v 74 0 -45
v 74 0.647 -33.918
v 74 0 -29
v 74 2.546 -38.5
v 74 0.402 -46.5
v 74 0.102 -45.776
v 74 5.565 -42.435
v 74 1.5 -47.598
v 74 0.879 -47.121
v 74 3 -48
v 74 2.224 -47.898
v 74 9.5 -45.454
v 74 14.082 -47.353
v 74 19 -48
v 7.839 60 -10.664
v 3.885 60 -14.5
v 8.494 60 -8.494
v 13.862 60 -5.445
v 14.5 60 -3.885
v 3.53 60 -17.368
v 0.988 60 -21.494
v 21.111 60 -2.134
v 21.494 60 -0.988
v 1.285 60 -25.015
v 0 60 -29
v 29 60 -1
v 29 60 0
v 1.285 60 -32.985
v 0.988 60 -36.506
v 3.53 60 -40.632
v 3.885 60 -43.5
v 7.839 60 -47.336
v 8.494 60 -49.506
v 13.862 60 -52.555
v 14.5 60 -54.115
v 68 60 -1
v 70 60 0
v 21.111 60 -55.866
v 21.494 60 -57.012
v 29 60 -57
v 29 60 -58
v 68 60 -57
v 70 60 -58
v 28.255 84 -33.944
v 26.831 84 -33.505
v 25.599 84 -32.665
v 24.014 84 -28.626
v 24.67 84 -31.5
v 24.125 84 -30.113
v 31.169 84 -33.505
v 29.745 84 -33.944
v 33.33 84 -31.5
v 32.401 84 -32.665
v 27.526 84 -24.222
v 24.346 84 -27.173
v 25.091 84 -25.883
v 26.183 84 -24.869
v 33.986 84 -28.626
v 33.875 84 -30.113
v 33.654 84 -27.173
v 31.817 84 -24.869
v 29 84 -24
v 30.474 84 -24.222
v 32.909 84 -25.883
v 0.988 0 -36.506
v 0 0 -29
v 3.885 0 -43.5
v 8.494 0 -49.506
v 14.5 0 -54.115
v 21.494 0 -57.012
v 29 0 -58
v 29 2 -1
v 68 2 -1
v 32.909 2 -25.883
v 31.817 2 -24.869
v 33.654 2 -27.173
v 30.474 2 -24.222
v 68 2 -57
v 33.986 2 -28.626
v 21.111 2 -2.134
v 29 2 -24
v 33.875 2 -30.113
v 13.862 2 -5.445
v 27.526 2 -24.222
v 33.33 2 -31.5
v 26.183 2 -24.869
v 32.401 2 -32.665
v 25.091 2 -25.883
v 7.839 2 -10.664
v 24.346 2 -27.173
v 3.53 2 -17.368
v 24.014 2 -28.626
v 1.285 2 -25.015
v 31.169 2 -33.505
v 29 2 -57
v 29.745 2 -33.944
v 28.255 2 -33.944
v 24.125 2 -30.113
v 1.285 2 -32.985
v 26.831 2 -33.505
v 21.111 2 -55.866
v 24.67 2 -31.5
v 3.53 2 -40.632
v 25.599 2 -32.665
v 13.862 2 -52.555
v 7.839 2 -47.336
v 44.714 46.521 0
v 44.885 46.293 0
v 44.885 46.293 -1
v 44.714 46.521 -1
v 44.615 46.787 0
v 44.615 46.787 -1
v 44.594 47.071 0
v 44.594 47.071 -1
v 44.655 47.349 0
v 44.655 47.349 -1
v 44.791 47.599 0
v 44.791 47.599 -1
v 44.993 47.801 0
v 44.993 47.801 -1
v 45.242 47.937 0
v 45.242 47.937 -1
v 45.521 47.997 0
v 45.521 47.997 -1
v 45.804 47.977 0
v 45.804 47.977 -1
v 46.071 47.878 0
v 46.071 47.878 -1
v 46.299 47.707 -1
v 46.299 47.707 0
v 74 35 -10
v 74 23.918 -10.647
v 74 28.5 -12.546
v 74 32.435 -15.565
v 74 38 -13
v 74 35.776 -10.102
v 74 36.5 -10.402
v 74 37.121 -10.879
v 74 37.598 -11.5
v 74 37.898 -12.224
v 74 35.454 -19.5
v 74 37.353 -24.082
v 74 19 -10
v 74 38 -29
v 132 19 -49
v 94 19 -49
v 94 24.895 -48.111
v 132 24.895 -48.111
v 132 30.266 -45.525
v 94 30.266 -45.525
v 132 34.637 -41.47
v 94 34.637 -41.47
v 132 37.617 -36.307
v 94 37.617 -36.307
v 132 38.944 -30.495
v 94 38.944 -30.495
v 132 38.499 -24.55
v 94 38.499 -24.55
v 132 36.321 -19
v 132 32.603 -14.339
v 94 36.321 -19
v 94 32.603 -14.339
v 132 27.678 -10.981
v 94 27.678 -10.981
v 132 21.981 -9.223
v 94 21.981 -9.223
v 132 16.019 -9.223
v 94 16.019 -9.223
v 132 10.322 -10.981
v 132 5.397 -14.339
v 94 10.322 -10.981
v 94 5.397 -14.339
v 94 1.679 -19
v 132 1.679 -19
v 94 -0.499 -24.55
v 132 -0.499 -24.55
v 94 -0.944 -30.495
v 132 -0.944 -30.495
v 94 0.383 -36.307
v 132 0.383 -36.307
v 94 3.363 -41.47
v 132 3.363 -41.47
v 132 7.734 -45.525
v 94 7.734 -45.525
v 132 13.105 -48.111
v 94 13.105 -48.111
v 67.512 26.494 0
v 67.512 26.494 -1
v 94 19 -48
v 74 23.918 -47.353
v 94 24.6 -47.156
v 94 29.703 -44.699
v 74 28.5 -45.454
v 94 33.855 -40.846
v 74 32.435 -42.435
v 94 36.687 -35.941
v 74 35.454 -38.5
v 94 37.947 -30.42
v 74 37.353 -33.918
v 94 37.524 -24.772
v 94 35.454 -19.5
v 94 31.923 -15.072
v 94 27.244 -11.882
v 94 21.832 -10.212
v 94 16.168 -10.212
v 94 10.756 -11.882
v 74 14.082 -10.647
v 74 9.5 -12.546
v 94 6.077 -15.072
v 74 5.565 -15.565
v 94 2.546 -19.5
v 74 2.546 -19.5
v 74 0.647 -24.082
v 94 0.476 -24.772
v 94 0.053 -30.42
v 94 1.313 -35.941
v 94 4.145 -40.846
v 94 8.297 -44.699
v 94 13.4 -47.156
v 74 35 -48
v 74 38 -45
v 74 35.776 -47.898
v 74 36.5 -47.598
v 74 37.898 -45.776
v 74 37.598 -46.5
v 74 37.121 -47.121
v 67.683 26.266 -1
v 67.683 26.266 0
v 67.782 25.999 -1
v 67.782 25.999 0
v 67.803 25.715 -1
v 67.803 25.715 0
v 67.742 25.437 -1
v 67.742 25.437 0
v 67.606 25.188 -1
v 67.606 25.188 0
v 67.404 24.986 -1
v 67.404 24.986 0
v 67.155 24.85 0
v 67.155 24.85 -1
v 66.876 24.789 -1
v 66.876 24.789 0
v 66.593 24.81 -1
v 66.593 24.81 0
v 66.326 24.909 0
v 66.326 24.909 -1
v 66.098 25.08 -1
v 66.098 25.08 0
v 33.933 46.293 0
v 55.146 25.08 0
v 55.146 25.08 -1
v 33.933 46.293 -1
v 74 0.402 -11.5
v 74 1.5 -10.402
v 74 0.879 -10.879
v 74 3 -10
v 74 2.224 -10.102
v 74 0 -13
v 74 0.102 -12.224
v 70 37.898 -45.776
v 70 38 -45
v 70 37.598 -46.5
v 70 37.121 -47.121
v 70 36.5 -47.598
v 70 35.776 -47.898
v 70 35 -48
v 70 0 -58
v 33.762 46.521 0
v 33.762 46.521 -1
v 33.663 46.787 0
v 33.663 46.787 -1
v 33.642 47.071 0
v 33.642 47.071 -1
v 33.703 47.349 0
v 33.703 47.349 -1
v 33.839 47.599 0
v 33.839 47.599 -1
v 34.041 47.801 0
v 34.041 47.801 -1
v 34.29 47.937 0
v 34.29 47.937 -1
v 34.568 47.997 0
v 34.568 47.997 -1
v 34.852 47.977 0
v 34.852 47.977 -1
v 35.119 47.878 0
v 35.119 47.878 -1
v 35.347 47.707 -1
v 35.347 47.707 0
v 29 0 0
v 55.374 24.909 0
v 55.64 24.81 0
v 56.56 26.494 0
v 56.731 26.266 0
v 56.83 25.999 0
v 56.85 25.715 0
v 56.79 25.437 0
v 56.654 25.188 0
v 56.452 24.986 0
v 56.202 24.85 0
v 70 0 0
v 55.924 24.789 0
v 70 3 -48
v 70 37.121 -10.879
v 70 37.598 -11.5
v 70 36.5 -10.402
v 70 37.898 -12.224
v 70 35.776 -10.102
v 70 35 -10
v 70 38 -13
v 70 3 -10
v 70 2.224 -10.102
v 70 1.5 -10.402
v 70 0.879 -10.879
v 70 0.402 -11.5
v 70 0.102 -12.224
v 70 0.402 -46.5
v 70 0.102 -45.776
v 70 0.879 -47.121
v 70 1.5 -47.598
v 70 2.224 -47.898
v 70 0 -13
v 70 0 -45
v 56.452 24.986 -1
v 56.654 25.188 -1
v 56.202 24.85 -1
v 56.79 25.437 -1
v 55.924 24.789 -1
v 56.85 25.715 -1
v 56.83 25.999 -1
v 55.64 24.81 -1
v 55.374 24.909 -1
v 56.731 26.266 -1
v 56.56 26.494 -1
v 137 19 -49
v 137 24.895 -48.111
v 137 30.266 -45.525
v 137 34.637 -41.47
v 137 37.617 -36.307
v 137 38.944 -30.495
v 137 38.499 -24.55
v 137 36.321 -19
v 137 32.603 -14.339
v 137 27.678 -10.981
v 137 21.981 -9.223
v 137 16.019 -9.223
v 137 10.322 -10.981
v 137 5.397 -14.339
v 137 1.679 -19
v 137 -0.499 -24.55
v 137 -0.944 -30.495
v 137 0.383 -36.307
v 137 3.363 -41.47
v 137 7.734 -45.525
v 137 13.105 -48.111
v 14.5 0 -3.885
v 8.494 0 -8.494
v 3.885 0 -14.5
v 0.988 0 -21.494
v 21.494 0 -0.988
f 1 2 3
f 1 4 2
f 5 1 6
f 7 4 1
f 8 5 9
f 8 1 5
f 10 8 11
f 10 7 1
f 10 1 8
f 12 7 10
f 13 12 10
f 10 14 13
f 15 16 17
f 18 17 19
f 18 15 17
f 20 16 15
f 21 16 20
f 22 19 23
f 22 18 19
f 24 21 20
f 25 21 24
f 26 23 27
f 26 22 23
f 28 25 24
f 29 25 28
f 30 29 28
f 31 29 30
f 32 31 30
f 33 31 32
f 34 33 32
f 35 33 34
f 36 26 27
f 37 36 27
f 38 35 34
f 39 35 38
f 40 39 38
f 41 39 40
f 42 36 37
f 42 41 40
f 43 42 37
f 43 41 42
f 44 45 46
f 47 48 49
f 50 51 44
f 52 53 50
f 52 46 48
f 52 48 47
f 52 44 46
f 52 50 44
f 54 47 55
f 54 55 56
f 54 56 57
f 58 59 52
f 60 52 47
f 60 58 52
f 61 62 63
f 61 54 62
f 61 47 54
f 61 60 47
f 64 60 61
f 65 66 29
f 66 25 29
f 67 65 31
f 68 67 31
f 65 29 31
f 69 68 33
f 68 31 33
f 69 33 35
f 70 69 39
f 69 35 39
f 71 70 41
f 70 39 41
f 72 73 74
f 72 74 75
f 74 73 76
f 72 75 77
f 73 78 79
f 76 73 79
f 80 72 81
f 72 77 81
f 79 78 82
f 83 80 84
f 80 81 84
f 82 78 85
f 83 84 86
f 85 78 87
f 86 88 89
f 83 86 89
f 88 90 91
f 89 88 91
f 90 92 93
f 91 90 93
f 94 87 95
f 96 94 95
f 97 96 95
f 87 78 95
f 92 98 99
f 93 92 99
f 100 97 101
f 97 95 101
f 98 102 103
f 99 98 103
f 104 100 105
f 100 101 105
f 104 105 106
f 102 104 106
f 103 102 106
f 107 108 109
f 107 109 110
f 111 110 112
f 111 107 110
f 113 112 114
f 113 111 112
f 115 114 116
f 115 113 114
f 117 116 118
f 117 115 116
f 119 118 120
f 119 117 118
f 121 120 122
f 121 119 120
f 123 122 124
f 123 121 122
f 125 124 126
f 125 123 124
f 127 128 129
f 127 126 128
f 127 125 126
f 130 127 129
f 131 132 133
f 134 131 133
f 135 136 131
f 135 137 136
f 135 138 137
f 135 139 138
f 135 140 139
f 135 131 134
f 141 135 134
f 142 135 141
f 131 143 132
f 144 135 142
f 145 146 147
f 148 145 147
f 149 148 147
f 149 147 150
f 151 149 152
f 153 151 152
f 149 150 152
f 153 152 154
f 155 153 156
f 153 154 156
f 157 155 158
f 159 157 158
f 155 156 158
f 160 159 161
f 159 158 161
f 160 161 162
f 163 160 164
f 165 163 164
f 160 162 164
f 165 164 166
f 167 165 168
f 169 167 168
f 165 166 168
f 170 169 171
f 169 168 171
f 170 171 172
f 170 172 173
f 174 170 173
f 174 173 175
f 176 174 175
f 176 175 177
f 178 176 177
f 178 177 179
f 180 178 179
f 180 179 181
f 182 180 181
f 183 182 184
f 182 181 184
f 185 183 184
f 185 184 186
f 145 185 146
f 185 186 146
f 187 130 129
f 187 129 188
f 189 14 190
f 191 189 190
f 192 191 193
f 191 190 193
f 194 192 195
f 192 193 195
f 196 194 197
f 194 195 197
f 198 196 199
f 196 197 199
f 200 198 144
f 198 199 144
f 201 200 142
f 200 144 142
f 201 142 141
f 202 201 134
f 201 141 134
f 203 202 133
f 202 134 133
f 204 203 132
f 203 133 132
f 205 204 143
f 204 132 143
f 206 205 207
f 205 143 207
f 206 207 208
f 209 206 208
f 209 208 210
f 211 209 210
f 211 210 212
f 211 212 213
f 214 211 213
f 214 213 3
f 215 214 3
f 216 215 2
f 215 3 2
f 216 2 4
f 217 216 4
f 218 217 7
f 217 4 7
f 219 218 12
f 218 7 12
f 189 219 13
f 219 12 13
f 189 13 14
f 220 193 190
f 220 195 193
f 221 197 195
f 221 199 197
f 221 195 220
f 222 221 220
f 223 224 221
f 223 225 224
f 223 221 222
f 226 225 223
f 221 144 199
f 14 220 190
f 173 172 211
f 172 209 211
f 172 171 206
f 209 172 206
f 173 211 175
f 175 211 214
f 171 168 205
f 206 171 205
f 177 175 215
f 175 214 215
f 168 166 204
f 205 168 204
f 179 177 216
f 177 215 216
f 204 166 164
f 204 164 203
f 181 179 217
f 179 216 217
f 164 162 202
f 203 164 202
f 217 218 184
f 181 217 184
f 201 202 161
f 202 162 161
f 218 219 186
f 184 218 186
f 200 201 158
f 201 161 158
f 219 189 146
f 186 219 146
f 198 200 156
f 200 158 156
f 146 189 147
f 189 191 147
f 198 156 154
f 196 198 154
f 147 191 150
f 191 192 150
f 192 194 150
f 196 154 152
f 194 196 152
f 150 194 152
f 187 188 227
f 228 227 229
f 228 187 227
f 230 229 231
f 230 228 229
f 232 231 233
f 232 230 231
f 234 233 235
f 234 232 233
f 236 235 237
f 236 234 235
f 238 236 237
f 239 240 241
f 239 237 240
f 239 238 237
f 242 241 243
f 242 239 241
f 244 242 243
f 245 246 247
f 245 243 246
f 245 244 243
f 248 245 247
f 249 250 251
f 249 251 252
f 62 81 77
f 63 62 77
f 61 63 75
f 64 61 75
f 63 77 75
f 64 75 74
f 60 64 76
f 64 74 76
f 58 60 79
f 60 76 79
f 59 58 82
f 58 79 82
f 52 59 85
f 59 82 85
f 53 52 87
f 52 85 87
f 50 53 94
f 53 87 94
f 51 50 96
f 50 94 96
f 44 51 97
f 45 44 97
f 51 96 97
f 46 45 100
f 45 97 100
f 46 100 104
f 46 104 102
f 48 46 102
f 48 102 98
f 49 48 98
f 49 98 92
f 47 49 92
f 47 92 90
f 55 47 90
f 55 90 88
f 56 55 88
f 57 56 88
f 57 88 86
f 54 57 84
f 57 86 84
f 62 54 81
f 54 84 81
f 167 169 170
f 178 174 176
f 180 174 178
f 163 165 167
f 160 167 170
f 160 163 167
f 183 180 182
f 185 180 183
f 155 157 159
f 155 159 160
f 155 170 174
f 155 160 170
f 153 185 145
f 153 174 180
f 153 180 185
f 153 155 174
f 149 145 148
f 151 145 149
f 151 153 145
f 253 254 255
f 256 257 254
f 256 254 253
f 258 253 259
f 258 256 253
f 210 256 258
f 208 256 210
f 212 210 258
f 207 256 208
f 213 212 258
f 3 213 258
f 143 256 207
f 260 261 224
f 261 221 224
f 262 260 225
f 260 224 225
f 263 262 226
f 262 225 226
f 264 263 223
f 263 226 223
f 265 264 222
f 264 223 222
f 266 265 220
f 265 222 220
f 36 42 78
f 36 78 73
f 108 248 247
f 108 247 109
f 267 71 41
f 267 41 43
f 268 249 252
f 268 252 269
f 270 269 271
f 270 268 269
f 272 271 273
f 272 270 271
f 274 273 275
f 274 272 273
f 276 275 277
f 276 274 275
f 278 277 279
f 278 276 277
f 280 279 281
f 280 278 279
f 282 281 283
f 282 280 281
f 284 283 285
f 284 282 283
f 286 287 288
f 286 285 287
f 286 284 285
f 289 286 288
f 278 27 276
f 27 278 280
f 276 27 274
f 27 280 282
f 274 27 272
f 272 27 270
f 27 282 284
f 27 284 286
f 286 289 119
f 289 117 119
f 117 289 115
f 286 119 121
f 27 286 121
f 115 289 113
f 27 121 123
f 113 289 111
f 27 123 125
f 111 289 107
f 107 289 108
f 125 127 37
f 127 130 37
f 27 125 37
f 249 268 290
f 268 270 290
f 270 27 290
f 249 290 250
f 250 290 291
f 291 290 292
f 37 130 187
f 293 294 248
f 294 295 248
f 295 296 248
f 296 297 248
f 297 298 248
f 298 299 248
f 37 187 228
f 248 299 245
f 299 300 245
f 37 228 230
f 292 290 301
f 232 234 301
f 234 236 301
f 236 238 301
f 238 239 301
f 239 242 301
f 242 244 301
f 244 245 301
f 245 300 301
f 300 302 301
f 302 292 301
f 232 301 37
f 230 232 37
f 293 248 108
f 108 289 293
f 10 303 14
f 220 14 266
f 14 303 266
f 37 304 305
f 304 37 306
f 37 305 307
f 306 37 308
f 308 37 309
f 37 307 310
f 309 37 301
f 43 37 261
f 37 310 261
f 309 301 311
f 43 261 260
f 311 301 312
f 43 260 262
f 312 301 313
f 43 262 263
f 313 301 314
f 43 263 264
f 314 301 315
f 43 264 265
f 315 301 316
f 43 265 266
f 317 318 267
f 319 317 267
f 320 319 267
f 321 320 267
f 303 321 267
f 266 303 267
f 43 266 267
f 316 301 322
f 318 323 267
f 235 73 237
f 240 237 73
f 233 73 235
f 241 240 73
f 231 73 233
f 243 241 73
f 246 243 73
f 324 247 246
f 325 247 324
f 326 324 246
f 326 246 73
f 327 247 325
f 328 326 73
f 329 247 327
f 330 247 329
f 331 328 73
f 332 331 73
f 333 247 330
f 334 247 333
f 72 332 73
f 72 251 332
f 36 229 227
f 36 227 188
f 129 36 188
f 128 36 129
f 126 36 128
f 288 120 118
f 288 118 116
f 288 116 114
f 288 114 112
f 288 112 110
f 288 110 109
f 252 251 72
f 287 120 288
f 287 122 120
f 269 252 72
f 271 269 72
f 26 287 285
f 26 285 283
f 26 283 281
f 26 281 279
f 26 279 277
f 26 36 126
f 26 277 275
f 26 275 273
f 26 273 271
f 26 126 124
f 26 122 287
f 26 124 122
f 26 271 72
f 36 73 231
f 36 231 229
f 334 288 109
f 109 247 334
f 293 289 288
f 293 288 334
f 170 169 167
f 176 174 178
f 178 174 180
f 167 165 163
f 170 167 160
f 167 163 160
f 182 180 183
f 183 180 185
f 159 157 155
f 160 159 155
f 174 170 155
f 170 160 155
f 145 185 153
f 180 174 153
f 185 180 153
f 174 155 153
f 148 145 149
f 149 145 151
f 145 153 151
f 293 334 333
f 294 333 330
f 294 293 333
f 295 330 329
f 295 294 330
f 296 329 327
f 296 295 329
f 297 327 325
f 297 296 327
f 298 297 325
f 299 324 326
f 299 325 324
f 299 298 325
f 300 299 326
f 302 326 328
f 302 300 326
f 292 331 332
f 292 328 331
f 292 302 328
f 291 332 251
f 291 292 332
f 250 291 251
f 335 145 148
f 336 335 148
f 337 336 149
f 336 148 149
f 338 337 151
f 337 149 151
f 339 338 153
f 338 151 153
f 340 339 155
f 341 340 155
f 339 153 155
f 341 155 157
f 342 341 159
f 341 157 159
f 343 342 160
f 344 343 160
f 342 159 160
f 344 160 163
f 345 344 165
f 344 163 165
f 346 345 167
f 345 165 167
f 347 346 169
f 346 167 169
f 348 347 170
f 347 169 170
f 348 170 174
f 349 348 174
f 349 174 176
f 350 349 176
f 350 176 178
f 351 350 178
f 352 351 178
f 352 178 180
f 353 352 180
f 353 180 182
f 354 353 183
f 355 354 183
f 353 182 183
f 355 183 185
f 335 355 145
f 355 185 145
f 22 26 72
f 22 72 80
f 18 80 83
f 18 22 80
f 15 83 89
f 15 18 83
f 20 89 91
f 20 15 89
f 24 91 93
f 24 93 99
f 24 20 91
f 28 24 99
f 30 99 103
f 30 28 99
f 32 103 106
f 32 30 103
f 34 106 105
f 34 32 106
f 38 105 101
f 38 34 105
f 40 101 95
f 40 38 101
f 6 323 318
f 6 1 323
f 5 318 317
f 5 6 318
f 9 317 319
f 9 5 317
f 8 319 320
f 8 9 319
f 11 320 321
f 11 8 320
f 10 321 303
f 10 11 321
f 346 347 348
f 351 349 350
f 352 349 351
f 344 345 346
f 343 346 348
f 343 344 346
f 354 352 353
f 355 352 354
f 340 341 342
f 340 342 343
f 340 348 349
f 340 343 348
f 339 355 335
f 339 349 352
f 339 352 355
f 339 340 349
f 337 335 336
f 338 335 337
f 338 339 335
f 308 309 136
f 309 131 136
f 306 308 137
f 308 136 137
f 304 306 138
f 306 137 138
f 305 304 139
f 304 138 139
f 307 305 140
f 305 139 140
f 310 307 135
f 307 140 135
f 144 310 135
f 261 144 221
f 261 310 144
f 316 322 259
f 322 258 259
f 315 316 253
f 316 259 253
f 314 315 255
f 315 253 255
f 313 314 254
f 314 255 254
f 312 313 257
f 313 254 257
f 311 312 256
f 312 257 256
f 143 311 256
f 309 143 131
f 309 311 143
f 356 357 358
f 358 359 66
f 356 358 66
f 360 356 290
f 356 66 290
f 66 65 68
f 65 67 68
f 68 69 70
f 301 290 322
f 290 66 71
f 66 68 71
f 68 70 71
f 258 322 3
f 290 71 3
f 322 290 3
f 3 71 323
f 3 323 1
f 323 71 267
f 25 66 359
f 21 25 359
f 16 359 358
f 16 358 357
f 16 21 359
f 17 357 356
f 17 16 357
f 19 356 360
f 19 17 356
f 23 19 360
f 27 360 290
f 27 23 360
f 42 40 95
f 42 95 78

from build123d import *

# Parameters (mm, degrees)
SKETCH1_W            = 70
SKETCH1_H            = 58
BOSS_EXTRUDE1_DEPTH  = 60
FILLET2_R            = 29
CUT_EXTRUDE1_DEPTH   = 58
SKETCH3_W            = 38
SKETCH3_H            = 38
BOSS_EXTRUDE6_DEPTH  = 4
FILLET4_R            = 3
SKETCH7_R            = 19
BOSS_EXTRUDE7_DEPTH  = 20
SKETCH8_R            = 20
BOSS_EXTRUDE8_DEPTH  = 38
SKETCH9_R            = 20
BOSS_EXTRUDE9_DEPTH  = 5
CUT_EXTRUDE2_DEPTH   = 5
SKETCH11_R           = 5
BOSS_EXTRUDE10_DEPTH = 82


with BuildPart() as part:
    # Sketch1 → Boss-Extrude1 (new body)
    with BuildSketch(Plane(origin=(0, 0, 0), x_dir=(1, 0, 0), z_dir=(0, 1, 0))):
        with Locations((35, 29)):
            Rectangle(SKETCH1_W, SKETCH1_H)
    extrude(amount=BOSS_EXTRUDE1_DEPTH)

    # Fillet2
    fillet2_edges = [part.edges().sort_by_distance(p)[0] for p in [
        (0, 30, 0),
        (0, 30, -58),
    ]]
    fillet(fillet2_edges, radius=FILLET2_R - 0.0001)  # a hair under: the kernel refuses the full size

    # Sketch2 → Cut-Extrude1 (cut)
    with BuildSketch(Plane(origin=(0, 60, 0), x_dir=(1, 0, 0), z_dir=(0, 1, 0))):
        with BuildLine():
            Line((29, 57), (68, 57))
            Line((68, 57), (68, 1))
            Line((68, 1), (29, 1))
            ThreePointArc((29, 1), (1, 29), (29, 57))
        make_face()
    extrude(amount=-CUT_EXTRUDE1_DEPTH, mode=Mode.SUBTRACT)

    # Sketch3 → Boss-Extrude6 (add)
    with BuildSketch(Plane(origin=(70, 0, 0), x_dir=(0, 0, -1), z_dir=(1, 0, 0))):
        with Locations((29, 19)):
            Rectangle(SKETCH3_W, SKETCH3_H)
    extrude(amount=BOSS_EXTRUDE6_DEPTH)

    # Fillet4
    fillet4_edges = [part.edges().sort_by_distance(p)[0] for p in [
        (72, 38, -10),
        (72, 0, -10),
        (72, 0, -48),
        (72, 38, -48),
    ]]
    fillet(fillet4_edges, radius=FILLET4_R)

    # Sketch7 → Boss-Extrude7 (add)
    with BuildSketch(Plane(origin=(74, 0, 0), x_dir=(0, 0, -1), z_dir=(1, 0, 0))):
        with Locations((29, 19)):
            Circle(SKETCH7_R)
    extrude(amount=BOSS_EXTRUDE7_DEPTH)

    # Sketch8 → Boss-Extrude8 (add)
    with BuildSketch(Plane(origin=(94, 0, 0), x_dir=(0, 0, -1), z_dir=(1, 0, 0))):
        with Locations((29, 19)):
            Circle(SKETCH8_R)
    extrude(amount=BOSS_EXTRUDE8_DEPTH)

    # Sketch10 → Cut-Extrude2 (cut)
    with BuildSketch(Plane.XY):
        with BuildLine():
            Line((35.346901033, 47.707106781), (56.560104469, 26.493903346))
            ThreePointArc((56.560104469, 26.493903346), (56.560104469, 25.079689783), (55.145890906, 25.079689783))
            Line((55.145890906, 25.079689783), (33.932687471, 46.292893219))
            ThreePointArc((33.932687471, 46.292893219), (33.932687471, 47.707106781), (35.346901033, 47.707106781))
        make_face()
        with BuildLine():
            Line((46.299007, 47.707106781), (67.512210435, 26.493903346))
            ThreePointArc((67.512210435, 26.493903346), (67.512210435, 25.079689783), (66.097996873, 25.079689783))
            Line((66.097996873, 25.079689783), (44.884793437, 46.292893219))
            ThreePointArc((44.884793437, 46.292893219), (44.884793437, 47.707106781), (46.299007, 47.707106781))
        make_face()
    extrude(amount=-CUT_EXTRUDE2_DEPTH, mode=Mode.SUBTRACT)

    # Sketch11 → Boss-Extrude10 (add)
    with BuildSketch(Plane(origin=(0, 2, 0), x_dir=(1, 0, 0), z_dir=(0, 1, 0))):
        with Locations(Location((29, 29, 0), (0, 0, 270))):
            Circle(SKETCH11_R)
    extrude(amount=BOSS_EXTRUDE10_DEPTH)


with BuildPart() as body_2:
    # Sketch9 → Boss-Extrude9 (new body)
    with BuildSketch(Plane(origin=(132, 0, 0), x_dir=(0, 0, -1), z_dir=(1, 0, 0))):
        with Locations((29, 19)):
            Circle(SKETCH9_R)
    extrude(amount=BOSS_EXTRUDE9_DEPTH)


solid = Compound([part.part, body_2.part])
